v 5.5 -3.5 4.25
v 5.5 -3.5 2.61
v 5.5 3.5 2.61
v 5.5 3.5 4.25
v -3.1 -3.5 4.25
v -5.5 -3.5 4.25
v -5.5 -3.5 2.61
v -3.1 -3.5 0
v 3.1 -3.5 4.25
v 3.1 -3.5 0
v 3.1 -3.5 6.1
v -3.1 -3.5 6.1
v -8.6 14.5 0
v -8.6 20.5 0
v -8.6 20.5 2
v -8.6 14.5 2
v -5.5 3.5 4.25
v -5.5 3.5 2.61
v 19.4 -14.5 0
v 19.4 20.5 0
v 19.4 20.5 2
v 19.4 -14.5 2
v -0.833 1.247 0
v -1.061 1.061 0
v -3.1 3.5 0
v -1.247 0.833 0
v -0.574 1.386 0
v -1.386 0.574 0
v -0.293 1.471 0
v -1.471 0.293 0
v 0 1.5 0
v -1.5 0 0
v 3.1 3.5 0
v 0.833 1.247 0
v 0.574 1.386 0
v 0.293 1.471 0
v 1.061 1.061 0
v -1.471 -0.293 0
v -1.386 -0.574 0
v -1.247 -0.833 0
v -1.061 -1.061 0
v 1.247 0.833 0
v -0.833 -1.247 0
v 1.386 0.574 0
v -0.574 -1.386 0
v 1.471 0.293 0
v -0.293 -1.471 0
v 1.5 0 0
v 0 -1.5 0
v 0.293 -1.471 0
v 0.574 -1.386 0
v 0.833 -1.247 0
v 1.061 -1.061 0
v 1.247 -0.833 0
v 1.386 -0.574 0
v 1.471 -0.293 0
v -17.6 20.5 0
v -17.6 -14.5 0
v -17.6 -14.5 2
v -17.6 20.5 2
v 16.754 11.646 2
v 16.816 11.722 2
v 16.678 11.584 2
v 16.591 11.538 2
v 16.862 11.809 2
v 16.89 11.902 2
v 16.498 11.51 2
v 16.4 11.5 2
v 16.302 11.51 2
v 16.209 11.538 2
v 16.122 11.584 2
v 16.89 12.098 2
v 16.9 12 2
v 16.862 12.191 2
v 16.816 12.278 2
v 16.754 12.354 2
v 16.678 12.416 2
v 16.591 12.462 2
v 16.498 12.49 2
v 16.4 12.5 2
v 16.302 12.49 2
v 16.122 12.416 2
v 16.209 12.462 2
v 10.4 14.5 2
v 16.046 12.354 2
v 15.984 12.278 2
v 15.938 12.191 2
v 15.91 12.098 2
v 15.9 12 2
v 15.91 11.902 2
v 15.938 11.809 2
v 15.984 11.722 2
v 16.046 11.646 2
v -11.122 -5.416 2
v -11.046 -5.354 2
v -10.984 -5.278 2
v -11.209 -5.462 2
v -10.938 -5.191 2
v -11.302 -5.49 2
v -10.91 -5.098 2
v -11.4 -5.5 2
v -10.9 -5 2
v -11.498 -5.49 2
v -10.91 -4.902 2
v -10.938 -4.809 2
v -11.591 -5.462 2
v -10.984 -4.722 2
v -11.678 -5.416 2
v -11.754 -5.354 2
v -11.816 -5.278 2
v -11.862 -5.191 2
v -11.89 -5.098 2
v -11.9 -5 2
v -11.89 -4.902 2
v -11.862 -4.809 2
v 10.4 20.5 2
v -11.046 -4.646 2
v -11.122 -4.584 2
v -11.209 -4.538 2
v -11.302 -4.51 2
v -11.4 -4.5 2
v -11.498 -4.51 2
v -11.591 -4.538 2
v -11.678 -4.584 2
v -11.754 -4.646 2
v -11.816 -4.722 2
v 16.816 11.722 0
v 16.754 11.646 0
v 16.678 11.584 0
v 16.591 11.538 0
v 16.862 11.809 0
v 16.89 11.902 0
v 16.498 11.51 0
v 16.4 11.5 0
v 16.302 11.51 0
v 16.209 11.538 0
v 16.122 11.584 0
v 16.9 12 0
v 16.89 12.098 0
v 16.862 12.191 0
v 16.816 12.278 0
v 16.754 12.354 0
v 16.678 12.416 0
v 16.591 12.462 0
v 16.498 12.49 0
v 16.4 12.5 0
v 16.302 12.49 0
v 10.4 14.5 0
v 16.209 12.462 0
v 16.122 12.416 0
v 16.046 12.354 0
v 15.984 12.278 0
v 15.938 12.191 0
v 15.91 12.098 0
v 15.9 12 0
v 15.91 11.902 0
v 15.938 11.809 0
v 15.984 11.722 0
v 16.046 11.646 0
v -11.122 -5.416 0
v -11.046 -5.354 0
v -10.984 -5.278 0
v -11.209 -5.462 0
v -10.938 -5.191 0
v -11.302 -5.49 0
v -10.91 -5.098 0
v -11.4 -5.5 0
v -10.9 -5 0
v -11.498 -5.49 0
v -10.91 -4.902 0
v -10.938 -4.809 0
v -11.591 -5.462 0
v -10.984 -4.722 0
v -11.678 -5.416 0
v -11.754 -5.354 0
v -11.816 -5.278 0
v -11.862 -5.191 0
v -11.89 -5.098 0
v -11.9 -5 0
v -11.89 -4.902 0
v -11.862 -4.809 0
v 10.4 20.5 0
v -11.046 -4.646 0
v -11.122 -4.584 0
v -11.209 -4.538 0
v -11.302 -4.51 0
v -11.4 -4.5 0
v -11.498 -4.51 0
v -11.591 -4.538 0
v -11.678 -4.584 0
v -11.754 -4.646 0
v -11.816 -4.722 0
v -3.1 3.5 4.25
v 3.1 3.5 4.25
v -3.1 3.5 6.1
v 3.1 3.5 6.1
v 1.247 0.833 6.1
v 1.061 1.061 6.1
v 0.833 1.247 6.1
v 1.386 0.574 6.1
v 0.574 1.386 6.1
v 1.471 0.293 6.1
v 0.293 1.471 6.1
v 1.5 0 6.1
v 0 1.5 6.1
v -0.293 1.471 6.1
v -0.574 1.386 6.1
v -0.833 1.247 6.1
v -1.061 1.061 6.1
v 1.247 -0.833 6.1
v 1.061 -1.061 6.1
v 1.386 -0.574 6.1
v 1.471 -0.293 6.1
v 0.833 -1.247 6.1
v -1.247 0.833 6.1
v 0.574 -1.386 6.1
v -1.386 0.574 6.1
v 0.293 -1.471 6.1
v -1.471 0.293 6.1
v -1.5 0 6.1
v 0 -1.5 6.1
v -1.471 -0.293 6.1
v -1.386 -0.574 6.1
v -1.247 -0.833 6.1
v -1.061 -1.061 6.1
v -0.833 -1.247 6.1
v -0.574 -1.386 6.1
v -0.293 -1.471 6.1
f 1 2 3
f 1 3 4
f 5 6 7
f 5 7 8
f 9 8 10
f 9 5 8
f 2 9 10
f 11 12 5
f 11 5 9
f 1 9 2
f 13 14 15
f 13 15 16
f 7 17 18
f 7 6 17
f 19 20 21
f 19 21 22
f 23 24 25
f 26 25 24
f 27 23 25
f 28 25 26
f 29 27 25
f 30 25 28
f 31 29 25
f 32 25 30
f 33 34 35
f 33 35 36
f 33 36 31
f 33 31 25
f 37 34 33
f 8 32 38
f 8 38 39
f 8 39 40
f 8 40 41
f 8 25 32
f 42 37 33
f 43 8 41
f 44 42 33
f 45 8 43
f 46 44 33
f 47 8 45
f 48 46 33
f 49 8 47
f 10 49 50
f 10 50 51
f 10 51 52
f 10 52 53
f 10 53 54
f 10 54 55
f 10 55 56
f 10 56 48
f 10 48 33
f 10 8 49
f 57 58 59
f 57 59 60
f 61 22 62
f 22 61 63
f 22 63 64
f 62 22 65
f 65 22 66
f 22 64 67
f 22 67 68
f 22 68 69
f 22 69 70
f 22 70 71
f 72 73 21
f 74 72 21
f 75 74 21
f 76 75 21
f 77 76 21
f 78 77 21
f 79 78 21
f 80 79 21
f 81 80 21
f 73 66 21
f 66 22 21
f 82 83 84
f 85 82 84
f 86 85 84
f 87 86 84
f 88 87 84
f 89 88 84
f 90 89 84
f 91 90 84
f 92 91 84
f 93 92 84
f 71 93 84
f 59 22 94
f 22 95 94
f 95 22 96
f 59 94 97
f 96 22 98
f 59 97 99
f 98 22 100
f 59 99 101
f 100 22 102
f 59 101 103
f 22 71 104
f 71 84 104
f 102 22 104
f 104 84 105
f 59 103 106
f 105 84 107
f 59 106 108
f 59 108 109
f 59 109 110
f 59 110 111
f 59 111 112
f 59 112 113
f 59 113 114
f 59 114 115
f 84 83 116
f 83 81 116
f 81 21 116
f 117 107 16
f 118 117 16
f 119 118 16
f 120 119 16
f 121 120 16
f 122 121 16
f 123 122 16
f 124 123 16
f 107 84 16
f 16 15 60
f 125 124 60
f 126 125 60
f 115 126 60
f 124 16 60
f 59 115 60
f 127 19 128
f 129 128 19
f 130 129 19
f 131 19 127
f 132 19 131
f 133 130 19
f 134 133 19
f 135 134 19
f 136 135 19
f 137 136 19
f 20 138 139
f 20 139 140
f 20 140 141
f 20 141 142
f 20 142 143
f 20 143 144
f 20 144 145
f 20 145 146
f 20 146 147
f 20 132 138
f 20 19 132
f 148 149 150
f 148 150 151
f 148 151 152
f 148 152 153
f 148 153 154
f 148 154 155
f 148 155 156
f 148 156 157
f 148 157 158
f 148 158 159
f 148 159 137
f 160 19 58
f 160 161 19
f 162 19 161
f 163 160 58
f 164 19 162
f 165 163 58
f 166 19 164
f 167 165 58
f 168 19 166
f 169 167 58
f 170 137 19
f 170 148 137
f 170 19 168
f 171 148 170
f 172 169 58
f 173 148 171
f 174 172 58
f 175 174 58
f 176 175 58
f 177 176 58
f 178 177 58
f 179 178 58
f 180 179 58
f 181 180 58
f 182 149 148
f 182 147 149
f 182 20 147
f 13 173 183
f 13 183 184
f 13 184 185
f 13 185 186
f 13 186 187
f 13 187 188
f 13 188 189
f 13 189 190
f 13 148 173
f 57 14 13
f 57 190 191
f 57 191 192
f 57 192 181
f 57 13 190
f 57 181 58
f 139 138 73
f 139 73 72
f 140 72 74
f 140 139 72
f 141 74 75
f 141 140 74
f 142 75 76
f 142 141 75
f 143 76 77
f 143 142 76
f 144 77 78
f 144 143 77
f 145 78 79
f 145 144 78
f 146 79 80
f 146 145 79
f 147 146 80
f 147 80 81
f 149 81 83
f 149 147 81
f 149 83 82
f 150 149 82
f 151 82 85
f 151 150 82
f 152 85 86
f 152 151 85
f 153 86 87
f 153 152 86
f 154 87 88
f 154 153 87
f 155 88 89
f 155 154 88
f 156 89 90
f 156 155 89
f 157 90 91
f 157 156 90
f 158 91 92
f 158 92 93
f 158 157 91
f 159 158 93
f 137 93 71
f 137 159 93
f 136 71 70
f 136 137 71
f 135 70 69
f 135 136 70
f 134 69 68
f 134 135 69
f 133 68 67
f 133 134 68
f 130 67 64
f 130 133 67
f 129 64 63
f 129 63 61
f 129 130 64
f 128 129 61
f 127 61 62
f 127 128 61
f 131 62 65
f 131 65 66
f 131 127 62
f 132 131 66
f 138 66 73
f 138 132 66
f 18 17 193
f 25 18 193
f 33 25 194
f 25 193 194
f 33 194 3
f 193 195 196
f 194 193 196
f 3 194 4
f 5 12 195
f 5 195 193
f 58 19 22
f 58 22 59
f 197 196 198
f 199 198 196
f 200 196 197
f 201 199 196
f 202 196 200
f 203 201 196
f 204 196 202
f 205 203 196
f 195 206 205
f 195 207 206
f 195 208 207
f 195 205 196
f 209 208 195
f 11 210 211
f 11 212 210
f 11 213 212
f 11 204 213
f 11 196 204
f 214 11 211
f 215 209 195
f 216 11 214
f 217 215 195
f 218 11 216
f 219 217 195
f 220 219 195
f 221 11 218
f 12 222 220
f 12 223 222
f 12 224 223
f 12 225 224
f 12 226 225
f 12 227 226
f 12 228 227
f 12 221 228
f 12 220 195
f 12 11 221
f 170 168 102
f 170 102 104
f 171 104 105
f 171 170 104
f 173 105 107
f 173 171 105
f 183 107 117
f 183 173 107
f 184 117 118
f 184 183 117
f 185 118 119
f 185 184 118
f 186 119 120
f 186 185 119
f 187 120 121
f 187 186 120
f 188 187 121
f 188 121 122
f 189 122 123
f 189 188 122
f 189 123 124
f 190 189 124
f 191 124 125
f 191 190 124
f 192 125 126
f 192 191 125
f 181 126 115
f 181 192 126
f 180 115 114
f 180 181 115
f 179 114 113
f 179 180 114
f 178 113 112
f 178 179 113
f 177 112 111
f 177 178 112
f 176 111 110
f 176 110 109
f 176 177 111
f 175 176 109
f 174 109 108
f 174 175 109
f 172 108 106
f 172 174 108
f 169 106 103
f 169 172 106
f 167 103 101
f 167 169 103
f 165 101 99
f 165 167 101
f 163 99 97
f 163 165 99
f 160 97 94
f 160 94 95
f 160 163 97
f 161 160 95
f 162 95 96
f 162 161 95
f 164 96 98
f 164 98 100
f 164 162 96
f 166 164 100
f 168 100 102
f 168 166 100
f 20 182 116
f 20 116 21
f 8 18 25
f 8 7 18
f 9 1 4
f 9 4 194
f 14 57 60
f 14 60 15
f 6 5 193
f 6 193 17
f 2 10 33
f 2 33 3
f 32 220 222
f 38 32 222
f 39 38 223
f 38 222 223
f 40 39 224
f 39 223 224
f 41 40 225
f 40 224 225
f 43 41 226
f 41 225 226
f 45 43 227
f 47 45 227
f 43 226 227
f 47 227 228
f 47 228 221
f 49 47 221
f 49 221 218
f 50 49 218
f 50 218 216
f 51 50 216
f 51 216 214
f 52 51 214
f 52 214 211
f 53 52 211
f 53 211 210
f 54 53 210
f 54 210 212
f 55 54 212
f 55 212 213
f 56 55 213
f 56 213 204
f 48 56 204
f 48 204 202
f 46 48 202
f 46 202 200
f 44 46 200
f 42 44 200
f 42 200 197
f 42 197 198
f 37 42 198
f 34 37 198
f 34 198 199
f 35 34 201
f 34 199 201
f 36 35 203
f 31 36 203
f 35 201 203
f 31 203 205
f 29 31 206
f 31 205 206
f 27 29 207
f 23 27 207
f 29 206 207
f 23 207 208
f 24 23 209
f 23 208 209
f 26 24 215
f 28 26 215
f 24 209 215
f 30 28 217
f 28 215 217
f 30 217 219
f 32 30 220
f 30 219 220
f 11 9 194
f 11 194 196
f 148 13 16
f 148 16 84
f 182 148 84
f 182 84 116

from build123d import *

# Parameters (mm, degrees)
SKETCH_R          = 0.5
PAD_DEPTH         = 2
PAD001_DEPTH      = 3.5
PAD001_DEPTH_BACK = 3.5
SKETCH002_R       = 1.5
POCKET_DEPTH      = 6.101


with BuildPart() as body:
    # Sketch → Pad (new body)
    with BuildSketch(Plane.XY):
        Polygon((-17.6, 20.5), (-8.6, 20.5), (-8.6, 14.5), (10.4, 14.5), (10.4, 20.5), (19.4, 20.5), (19.4, -14.5), (-17.6, -14.5), align=None)
        with Locations((16.4, 12)):
            Circle(SKETCH_R, mode=Mode.SUBTRACT)
        with Locations((-11.4, -5)):
            Circle(SKETCH_R, mode=Mode.SUBTRACT)
    extrude(amount=PAD_DEPTH)


with BuildPart() as tnut:
    # Sketch001 → Pad001 (new body, two sides)
    with BuildSketch(Plane.XZ) as pad001_sk:
        Polygon((-3.1, 0), (3.1, 0), (5.5, 2.61), (5.5, 4.25), (3.1, 4.25), (3.1, 6.1), (-3.1, 6.1), (-3.1, 4.25), (-5.5, 4.25), (-5.5, 2.61), align=None)
    extrude(amount=PAD001_DEPTH)
    extrude(pad001_sk.sketch, amount=-PAD001_DEPTH_BACK)

    # Sketch002 (on Face6 of Pad001) → Pocket (cut, through all)
    with BuildSketch(Plane(origin=(0, 0, 6.1), x_dir=(-1, 0, 0), z_dir=(0, 0, 1))):
        Circle(SKETCH002_R)
    extrude(amount=-POCKET_DEPTH, mode=Mode.SUBTRACT)


solid = Compound([body.part, tnut.part])
